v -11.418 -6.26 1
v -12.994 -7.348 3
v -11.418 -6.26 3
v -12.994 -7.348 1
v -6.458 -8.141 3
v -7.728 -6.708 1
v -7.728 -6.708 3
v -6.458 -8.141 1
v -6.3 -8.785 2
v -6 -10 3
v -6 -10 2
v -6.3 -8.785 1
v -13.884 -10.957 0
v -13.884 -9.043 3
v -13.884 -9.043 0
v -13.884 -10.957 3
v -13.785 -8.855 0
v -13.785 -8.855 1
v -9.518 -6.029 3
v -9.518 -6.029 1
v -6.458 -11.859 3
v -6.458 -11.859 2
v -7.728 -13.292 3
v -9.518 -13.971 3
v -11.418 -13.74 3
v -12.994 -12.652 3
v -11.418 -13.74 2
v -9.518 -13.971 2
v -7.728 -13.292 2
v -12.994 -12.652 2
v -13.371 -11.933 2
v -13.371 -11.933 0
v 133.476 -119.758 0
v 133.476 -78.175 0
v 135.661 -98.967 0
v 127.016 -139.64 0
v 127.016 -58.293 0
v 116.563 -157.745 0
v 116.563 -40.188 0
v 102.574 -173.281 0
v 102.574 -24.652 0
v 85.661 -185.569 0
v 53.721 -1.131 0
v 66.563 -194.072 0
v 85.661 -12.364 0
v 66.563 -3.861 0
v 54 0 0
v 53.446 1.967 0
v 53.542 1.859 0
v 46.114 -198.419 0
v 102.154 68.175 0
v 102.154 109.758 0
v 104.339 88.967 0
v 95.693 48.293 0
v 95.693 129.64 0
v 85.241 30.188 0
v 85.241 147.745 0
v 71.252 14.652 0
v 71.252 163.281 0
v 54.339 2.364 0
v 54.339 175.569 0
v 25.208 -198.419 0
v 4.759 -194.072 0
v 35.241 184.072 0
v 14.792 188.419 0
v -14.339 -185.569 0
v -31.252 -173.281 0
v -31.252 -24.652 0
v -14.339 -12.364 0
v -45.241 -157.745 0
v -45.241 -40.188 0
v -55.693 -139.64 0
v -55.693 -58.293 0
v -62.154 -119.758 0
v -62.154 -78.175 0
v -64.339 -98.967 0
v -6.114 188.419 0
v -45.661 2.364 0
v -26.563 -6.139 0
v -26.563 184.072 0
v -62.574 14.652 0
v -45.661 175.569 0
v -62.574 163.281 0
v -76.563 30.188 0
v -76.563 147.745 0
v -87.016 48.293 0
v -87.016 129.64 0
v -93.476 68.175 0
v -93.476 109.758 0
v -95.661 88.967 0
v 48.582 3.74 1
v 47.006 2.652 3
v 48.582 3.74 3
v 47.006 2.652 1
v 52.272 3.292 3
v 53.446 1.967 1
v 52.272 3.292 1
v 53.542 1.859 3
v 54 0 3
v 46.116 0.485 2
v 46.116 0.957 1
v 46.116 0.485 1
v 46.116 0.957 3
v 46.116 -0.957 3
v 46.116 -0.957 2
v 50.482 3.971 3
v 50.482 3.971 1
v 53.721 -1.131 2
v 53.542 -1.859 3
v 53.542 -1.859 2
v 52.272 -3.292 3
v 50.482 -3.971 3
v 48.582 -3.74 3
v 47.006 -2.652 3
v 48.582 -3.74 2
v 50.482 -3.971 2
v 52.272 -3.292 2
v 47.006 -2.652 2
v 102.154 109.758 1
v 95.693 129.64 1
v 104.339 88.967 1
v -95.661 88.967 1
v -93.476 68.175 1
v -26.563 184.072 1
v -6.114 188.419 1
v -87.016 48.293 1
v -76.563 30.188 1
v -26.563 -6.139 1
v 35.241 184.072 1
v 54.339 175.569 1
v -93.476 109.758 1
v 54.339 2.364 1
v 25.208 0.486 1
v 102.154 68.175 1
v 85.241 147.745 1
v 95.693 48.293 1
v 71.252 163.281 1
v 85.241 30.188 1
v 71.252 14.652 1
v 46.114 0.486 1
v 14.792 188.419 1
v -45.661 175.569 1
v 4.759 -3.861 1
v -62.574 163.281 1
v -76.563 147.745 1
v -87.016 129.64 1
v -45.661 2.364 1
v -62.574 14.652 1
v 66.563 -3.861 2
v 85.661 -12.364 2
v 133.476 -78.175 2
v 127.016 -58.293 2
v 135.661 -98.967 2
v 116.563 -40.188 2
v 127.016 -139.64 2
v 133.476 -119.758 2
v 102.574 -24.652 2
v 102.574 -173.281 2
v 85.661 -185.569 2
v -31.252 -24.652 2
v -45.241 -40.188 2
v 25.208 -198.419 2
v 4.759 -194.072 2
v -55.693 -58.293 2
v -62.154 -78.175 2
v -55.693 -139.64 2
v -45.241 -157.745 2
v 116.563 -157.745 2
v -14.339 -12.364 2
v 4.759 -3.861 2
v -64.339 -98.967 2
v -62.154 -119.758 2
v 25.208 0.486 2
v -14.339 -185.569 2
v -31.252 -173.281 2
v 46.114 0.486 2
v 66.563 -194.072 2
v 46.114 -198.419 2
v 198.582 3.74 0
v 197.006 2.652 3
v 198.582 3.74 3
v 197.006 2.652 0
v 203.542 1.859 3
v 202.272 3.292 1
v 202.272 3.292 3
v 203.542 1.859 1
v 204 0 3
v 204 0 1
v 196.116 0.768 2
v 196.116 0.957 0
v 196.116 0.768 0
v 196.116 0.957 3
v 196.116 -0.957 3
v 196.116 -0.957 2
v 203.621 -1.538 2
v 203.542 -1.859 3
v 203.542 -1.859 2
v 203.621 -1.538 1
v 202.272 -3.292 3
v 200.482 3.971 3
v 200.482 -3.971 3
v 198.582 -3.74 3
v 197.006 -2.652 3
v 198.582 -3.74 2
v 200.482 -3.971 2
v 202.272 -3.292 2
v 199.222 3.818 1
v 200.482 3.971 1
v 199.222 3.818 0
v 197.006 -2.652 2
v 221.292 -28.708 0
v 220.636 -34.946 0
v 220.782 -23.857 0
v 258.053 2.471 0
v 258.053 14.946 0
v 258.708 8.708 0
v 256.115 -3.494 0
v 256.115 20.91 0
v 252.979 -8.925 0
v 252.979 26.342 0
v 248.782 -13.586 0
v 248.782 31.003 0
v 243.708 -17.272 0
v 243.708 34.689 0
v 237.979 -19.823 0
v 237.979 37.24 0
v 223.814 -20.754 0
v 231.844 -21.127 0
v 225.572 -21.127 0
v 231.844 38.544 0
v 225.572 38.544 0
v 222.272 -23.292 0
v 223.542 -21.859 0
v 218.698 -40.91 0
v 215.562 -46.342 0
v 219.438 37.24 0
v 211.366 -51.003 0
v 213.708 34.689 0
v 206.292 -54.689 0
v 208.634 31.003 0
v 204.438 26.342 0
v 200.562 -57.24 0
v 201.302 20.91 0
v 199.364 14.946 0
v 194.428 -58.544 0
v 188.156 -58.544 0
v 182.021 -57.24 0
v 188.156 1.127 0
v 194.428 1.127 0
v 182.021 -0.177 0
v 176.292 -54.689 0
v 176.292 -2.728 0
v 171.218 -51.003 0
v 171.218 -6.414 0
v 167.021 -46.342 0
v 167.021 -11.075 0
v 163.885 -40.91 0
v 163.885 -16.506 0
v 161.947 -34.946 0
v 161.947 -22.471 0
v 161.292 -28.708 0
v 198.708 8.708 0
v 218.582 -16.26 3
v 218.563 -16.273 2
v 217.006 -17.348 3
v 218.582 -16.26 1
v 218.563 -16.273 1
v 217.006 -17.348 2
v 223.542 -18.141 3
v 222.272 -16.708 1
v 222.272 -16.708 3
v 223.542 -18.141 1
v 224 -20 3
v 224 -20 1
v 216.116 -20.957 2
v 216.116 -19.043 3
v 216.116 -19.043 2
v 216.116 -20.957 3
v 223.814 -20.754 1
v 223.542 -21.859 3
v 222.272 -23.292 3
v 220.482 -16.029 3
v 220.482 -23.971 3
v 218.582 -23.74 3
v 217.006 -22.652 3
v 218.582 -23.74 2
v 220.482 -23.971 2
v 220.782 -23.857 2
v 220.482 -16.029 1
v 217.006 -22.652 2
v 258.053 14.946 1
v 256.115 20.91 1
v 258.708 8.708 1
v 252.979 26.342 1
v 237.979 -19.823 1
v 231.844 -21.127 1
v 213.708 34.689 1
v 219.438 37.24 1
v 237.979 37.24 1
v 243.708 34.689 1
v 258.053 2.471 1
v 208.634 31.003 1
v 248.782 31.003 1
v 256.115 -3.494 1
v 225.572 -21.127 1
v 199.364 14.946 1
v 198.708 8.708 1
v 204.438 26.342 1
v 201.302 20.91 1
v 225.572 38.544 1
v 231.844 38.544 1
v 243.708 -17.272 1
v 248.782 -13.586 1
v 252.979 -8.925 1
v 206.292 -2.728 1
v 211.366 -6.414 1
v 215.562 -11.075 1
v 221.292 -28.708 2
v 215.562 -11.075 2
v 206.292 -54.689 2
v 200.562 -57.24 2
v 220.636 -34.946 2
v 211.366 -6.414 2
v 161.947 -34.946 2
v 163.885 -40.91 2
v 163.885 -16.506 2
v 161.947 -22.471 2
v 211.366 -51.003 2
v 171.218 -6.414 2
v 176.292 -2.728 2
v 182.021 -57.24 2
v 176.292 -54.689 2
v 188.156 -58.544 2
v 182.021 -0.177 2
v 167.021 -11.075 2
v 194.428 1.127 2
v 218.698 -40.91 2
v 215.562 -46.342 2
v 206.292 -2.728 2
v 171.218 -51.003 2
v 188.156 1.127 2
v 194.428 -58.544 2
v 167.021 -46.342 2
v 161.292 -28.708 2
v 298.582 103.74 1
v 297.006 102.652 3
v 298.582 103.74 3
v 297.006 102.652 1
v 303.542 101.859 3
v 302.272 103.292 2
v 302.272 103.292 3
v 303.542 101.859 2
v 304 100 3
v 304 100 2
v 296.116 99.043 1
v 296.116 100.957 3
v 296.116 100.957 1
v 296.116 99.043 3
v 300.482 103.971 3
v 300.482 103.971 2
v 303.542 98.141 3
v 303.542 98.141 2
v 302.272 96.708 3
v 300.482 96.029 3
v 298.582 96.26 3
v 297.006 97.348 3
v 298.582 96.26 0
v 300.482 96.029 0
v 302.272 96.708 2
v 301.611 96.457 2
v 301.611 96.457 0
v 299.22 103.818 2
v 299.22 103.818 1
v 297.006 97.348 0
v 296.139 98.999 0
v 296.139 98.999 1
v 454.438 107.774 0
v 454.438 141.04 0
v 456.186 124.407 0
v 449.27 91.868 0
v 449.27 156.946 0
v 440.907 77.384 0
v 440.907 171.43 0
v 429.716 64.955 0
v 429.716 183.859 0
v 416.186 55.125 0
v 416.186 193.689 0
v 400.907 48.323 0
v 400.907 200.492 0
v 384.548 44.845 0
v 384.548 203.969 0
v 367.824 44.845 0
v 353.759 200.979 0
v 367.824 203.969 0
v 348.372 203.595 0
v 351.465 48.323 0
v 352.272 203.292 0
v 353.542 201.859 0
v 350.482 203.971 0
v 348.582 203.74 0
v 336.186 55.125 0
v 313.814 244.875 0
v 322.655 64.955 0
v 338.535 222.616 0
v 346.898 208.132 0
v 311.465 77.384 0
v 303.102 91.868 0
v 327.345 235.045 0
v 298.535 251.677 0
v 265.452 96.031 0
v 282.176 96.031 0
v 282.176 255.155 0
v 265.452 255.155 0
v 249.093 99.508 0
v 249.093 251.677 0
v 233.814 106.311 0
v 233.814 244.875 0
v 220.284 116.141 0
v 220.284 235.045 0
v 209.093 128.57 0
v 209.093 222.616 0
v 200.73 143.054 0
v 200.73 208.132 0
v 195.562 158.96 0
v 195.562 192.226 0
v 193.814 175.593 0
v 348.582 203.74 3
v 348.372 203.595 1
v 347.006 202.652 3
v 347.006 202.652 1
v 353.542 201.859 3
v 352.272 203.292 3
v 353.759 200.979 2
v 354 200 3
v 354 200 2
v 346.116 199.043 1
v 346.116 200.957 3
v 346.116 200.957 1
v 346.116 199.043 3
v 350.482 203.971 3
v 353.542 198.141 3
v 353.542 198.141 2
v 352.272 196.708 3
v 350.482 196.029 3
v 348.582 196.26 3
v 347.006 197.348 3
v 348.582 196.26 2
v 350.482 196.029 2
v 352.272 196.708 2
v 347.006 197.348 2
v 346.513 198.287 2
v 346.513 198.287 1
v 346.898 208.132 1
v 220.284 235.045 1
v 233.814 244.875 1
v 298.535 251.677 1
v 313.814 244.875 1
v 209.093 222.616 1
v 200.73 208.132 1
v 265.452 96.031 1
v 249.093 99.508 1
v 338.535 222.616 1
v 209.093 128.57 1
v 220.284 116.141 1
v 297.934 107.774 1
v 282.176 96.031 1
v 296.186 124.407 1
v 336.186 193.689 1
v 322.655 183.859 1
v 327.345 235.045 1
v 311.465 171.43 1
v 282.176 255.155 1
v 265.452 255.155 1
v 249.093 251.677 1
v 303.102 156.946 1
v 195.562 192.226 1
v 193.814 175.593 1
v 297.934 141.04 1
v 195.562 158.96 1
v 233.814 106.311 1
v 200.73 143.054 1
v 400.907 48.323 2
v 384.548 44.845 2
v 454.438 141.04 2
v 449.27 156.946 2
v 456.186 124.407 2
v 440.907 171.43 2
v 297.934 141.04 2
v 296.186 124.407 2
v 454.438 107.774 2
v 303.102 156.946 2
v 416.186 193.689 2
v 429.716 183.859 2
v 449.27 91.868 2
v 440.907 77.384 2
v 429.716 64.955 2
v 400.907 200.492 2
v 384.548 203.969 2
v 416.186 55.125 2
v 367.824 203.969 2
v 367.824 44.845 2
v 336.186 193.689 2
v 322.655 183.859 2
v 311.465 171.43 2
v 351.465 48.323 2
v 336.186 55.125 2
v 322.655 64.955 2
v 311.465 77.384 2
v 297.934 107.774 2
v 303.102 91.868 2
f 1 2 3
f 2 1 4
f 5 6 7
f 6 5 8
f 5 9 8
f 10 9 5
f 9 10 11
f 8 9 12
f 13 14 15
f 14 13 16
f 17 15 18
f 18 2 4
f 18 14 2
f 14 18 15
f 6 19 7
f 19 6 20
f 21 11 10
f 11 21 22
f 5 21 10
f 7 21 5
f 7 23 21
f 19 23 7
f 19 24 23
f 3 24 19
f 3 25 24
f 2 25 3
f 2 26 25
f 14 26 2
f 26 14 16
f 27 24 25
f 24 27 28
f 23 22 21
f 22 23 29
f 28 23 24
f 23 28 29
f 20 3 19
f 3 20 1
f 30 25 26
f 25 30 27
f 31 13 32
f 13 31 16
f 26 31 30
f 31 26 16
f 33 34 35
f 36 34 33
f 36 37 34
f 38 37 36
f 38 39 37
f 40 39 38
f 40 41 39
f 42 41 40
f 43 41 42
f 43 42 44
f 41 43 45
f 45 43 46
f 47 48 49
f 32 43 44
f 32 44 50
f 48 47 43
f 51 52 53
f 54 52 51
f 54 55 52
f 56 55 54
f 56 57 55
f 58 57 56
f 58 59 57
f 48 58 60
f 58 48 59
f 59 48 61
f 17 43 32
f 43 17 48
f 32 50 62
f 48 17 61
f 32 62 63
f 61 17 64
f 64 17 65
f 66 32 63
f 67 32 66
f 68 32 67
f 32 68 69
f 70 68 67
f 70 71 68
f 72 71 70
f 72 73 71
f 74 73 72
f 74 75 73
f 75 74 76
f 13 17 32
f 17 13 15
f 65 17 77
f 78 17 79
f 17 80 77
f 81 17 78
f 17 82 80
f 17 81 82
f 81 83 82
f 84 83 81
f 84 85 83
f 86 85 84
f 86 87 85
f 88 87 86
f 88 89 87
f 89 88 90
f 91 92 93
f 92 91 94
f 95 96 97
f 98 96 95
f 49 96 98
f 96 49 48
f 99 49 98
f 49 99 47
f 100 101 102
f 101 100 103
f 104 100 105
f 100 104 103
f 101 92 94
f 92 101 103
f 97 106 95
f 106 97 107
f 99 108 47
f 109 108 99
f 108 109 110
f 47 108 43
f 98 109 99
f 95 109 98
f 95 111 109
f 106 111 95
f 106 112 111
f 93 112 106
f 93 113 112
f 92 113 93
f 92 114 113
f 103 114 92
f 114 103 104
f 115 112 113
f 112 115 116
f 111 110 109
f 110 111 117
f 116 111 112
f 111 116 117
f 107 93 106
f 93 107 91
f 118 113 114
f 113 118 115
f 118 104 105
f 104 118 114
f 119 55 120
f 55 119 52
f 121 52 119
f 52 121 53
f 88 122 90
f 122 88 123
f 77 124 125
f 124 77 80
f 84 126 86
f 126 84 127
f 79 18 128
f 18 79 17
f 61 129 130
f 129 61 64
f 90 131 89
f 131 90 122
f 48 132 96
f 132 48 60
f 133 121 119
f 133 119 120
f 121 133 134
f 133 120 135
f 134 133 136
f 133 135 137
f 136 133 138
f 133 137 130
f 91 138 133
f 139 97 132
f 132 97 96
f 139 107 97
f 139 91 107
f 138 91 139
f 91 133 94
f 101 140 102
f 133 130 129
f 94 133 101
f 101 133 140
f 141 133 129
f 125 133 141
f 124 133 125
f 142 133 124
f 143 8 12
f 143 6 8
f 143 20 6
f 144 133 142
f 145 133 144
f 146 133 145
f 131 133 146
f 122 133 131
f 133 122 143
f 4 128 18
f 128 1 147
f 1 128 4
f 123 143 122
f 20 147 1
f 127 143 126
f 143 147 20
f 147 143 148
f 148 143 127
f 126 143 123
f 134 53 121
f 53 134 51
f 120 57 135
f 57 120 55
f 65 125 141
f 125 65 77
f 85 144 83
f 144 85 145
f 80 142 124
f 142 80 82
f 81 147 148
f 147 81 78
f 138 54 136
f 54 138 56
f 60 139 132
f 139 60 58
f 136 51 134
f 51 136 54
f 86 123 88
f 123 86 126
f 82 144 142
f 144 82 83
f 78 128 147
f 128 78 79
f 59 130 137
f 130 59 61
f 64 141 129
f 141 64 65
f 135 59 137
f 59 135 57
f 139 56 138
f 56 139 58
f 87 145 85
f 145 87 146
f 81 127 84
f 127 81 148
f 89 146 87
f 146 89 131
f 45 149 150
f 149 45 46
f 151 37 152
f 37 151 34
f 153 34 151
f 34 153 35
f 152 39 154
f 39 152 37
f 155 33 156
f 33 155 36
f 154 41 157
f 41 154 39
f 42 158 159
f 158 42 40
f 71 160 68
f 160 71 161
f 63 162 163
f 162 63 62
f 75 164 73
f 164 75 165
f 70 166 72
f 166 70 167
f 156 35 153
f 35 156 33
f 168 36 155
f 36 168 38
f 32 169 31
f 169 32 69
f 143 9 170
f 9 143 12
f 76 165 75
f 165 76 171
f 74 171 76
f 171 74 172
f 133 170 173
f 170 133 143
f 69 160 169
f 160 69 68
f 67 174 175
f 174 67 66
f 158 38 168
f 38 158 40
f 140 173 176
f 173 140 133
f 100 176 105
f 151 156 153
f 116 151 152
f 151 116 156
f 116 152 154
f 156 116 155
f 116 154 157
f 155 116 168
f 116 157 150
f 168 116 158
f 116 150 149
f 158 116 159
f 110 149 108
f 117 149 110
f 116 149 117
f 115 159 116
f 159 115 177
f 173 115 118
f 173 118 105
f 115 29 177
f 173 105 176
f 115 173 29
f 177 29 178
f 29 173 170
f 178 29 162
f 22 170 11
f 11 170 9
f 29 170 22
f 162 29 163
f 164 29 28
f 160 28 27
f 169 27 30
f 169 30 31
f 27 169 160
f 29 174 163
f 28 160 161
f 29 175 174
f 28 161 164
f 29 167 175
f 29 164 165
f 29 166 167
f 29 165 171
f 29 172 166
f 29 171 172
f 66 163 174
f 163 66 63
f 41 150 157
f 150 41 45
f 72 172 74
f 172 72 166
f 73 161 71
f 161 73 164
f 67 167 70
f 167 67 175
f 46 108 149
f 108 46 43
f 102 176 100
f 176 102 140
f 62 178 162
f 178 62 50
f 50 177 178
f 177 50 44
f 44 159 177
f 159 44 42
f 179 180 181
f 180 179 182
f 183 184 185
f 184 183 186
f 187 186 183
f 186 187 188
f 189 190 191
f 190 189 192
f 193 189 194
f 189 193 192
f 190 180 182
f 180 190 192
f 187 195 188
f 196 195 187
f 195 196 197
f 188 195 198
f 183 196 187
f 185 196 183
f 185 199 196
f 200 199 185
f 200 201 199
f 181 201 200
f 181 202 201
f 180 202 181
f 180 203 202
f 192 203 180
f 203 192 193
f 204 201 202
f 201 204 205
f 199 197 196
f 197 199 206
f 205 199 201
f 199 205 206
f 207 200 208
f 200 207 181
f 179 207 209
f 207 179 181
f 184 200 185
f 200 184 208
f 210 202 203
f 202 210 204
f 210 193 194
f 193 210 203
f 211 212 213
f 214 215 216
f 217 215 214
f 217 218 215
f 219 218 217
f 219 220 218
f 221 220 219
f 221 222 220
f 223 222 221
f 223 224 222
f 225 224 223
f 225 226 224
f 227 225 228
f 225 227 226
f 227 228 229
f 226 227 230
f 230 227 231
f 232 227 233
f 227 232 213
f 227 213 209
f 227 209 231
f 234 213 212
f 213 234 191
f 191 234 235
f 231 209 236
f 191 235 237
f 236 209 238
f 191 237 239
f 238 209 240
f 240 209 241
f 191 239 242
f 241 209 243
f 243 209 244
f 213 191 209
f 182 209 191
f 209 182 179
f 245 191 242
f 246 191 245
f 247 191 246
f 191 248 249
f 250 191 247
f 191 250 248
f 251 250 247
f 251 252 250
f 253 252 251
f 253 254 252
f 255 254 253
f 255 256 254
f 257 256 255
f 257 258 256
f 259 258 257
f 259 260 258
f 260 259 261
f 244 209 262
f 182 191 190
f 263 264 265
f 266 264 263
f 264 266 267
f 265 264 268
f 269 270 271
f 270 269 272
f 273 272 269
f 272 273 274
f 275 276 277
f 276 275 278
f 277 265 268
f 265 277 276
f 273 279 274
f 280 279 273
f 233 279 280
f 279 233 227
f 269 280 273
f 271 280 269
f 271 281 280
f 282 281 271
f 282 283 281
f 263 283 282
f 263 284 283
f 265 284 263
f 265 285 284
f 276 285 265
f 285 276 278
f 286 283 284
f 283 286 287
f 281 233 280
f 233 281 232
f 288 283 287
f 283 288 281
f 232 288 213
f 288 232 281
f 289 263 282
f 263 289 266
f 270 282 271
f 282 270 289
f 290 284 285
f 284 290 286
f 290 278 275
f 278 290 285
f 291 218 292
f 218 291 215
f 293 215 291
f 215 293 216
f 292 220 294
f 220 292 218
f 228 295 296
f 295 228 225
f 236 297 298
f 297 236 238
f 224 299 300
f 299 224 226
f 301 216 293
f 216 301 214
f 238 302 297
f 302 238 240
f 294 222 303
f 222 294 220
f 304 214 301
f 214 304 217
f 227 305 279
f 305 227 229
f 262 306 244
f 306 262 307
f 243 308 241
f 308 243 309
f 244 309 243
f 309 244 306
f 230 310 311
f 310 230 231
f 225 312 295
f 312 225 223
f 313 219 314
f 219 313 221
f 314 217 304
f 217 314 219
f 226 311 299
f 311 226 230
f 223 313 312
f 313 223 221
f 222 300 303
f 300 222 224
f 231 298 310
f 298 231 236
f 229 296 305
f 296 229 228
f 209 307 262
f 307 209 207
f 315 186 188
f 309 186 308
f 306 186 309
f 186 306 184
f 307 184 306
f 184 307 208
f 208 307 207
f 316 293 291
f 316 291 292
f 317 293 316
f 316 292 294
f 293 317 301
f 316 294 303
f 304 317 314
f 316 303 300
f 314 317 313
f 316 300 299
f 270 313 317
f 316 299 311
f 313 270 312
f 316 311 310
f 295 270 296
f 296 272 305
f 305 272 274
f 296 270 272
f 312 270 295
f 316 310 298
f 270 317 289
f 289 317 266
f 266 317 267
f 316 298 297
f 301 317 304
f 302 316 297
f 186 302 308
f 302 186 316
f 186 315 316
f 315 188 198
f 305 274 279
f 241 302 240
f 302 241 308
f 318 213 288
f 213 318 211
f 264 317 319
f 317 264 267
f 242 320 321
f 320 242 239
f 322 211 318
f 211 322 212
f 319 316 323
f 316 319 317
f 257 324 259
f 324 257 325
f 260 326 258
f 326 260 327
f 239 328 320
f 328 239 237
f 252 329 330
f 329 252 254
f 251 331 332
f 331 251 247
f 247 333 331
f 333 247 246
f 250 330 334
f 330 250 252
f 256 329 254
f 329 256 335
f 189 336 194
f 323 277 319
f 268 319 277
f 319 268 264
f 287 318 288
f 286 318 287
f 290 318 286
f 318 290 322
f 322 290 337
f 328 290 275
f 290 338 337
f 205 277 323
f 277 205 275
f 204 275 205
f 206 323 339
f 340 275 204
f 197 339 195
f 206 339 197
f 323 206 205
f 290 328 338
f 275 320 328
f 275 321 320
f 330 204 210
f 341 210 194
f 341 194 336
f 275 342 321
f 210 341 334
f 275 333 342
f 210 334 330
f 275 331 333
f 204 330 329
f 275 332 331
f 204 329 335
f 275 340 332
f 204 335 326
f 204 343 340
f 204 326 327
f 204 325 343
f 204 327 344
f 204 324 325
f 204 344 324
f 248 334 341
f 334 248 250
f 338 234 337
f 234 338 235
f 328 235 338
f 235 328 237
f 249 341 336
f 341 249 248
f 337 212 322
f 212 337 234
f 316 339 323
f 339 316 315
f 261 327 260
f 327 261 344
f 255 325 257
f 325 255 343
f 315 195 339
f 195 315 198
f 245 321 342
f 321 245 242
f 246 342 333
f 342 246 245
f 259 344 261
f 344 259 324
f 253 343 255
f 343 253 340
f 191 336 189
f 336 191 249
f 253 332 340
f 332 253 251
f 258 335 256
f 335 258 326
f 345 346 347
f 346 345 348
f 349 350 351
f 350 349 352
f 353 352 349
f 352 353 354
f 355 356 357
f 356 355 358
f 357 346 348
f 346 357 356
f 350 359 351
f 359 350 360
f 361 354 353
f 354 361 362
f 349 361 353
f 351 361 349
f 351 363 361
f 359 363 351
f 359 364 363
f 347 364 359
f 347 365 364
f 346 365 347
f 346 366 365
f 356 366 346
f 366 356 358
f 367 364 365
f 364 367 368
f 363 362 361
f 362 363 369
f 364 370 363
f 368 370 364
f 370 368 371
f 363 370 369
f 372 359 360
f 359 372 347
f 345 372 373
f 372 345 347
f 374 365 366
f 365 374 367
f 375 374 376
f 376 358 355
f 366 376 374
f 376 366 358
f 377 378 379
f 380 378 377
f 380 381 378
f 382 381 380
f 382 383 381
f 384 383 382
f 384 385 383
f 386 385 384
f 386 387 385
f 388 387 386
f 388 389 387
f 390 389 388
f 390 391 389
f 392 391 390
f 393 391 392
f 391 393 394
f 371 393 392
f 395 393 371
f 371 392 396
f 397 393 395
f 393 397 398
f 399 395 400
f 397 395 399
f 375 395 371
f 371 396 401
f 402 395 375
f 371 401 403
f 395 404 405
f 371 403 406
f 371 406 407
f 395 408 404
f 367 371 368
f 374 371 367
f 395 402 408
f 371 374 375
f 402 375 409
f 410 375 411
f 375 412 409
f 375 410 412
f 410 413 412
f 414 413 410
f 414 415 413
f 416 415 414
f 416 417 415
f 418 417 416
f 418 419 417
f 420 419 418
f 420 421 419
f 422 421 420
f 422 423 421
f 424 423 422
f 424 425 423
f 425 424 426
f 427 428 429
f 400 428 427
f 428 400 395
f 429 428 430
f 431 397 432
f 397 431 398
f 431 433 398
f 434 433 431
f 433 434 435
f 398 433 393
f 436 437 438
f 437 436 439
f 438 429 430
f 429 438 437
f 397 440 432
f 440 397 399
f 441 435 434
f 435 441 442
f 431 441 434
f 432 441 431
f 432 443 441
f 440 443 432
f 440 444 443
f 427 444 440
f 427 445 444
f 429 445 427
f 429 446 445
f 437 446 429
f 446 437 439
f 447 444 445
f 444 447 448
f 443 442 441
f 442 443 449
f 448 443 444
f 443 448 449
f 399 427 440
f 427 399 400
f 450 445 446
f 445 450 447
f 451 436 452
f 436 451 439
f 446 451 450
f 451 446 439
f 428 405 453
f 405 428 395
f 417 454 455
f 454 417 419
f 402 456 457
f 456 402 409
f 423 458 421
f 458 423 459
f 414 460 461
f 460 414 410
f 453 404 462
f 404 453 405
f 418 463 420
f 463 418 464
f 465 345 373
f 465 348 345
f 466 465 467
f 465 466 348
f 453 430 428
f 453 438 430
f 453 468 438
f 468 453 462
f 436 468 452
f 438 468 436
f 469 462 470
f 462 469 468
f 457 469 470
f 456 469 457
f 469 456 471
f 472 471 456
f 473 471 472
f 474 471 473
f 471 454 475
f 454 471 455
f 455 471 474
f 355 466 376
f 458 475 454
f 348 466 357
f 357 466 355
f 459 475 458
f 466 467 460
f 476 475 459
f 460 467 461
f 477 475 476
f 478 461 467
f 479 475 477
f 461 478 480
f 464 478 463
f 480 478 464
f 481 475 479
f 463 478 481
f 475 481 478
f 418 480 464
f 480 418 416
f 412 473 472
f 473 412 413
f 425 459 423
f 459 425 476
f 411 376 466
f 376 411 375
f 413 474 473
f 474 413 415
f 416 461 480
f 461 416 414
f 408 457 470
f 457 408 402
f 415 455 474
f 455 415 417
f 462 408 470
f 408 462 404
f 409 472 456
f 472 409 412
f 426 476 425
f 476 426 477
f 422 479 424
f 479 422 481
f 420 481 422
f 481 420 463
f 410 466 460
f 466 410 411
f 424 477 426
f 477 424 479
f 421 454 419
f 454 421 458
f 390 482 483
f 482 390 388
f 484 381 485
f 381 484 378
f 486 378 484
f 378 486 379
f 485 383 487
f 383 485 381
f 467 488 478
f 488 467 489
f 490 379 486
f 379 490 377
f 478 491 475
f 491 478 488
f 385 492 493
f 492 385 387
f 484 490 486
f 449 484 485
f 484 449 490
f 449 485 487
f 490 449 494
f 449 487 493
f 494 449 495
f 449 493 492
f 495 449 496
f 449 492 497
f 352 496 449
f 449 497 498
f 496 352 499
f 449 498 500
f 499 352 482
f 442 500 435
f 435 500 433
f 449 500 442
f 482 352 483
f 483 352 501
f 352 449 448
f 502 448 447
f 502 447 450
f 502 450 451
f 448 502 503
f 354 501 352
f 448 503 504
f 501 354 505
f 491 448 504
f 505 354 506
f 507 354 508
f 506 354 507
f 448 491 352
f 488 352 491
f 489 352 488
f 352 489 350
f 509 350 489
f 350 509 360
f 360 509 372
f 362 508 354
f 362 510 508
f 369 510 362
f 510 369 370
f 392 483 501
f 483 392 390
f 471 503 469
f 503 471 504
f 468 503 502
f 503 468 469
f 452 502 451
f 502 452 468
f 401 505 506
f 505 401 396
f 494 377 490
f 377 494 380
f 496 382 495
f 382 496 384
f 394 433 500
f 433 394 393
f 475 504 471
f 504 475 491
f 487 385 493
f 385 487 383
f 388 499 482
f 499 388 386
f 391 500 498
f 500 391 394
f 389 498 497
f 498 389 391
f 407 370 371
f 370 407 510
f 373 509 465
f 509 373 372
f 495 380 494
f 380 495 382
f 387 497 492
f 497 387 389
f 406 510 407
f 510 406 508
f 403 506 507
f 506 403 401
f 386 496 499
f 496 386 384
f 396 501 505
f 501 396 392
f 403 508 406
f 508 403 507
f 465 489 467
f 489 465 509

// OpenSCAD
// distance between two points
function distance(p1, p2) = sqrt((difference(p2.x, p1.x)) ^ 2 + (difference(p2.y, p1.y) ^ 2));
// difference between two values in any order
function difference(a, b) = let(x = a > b ? a - b : b - a) x;

// function to find the circles of given radius through two points
function circles_of_given_radius_through_two_points(p1, p2, radius) =
    let(mid = (p1 + p2)/2, q = distance(p1, p2), x_dist = sqrt(radius ^ 2 - (q / 2) ^ 2) * (p1.y - p2.y) / q,
        y_dist = sqrt(radius ^ 2 - (q / 2) ^ 2) * (p2.x - p1.x) / q)
    // point 1 and point 2 must not be the same point
    assert(p1 != p2)
    // radius must be more than 0
    assert(radius > 0)
    // distance between points cannot be more than diameter
    assert(q < radius * 2)
        // return both qualifying centres
        [mid + [ x_dist, y_dist ], mid - [ x_dist, y_dist ]];

// test module for circles_of_given_radius_through_two_points
module test_circles_of_given_radius_through_two_points()
{
    tests = [
        [ [ -10, -10, 0 ], [ 50, 0, 0 ], 100 ], [ [ 200, 0, 0 ], [ 220, -20, 0 ], 30 ],
        [ [ 300, 100, 0 ], [ 350, 200, 0 ], 80 ]
    ];

    for (t = tests)
    {
        let(start = t[0], end = t[1], radius = t[2])
        {
            // plot start and end dots - these should be at the intersections of the circles
            color("green") translate(start) cylinder(h = 3, r = 4);
            color("green") translate(end) cylinder(h = 3, r = 4);

            // call function
            centres = circles_of_given_radius_through_two_points(start, end, radius);
            echo("centres", centres);
            // plot results
            color("yellow") translate(centres[0]) cylinder(h = 1, r = radius);
            color("red") translate(centres[1]) cylinder(h = 2, r = radius);
        };
    };
    // The following tests will stop all execution. To run them, uncomment one at a time
    // should fail - same points
    // echo(circles_of_given_radius_through_two_points([0,0],[0,0],1));
    // should fail - points are more than diameter apart
    // echo(circles_of_given_radius_through_two_points(p1 = [0,0], p2 = [0,101], radius = 50));
    // should fail - radius must be greater than 0
    // echo(circles_of_given_radius_through_two_points(p1= [1,1], p2 = [10,1], radius = 0));
}

test_circles_of_given_radius_through_two_points();
